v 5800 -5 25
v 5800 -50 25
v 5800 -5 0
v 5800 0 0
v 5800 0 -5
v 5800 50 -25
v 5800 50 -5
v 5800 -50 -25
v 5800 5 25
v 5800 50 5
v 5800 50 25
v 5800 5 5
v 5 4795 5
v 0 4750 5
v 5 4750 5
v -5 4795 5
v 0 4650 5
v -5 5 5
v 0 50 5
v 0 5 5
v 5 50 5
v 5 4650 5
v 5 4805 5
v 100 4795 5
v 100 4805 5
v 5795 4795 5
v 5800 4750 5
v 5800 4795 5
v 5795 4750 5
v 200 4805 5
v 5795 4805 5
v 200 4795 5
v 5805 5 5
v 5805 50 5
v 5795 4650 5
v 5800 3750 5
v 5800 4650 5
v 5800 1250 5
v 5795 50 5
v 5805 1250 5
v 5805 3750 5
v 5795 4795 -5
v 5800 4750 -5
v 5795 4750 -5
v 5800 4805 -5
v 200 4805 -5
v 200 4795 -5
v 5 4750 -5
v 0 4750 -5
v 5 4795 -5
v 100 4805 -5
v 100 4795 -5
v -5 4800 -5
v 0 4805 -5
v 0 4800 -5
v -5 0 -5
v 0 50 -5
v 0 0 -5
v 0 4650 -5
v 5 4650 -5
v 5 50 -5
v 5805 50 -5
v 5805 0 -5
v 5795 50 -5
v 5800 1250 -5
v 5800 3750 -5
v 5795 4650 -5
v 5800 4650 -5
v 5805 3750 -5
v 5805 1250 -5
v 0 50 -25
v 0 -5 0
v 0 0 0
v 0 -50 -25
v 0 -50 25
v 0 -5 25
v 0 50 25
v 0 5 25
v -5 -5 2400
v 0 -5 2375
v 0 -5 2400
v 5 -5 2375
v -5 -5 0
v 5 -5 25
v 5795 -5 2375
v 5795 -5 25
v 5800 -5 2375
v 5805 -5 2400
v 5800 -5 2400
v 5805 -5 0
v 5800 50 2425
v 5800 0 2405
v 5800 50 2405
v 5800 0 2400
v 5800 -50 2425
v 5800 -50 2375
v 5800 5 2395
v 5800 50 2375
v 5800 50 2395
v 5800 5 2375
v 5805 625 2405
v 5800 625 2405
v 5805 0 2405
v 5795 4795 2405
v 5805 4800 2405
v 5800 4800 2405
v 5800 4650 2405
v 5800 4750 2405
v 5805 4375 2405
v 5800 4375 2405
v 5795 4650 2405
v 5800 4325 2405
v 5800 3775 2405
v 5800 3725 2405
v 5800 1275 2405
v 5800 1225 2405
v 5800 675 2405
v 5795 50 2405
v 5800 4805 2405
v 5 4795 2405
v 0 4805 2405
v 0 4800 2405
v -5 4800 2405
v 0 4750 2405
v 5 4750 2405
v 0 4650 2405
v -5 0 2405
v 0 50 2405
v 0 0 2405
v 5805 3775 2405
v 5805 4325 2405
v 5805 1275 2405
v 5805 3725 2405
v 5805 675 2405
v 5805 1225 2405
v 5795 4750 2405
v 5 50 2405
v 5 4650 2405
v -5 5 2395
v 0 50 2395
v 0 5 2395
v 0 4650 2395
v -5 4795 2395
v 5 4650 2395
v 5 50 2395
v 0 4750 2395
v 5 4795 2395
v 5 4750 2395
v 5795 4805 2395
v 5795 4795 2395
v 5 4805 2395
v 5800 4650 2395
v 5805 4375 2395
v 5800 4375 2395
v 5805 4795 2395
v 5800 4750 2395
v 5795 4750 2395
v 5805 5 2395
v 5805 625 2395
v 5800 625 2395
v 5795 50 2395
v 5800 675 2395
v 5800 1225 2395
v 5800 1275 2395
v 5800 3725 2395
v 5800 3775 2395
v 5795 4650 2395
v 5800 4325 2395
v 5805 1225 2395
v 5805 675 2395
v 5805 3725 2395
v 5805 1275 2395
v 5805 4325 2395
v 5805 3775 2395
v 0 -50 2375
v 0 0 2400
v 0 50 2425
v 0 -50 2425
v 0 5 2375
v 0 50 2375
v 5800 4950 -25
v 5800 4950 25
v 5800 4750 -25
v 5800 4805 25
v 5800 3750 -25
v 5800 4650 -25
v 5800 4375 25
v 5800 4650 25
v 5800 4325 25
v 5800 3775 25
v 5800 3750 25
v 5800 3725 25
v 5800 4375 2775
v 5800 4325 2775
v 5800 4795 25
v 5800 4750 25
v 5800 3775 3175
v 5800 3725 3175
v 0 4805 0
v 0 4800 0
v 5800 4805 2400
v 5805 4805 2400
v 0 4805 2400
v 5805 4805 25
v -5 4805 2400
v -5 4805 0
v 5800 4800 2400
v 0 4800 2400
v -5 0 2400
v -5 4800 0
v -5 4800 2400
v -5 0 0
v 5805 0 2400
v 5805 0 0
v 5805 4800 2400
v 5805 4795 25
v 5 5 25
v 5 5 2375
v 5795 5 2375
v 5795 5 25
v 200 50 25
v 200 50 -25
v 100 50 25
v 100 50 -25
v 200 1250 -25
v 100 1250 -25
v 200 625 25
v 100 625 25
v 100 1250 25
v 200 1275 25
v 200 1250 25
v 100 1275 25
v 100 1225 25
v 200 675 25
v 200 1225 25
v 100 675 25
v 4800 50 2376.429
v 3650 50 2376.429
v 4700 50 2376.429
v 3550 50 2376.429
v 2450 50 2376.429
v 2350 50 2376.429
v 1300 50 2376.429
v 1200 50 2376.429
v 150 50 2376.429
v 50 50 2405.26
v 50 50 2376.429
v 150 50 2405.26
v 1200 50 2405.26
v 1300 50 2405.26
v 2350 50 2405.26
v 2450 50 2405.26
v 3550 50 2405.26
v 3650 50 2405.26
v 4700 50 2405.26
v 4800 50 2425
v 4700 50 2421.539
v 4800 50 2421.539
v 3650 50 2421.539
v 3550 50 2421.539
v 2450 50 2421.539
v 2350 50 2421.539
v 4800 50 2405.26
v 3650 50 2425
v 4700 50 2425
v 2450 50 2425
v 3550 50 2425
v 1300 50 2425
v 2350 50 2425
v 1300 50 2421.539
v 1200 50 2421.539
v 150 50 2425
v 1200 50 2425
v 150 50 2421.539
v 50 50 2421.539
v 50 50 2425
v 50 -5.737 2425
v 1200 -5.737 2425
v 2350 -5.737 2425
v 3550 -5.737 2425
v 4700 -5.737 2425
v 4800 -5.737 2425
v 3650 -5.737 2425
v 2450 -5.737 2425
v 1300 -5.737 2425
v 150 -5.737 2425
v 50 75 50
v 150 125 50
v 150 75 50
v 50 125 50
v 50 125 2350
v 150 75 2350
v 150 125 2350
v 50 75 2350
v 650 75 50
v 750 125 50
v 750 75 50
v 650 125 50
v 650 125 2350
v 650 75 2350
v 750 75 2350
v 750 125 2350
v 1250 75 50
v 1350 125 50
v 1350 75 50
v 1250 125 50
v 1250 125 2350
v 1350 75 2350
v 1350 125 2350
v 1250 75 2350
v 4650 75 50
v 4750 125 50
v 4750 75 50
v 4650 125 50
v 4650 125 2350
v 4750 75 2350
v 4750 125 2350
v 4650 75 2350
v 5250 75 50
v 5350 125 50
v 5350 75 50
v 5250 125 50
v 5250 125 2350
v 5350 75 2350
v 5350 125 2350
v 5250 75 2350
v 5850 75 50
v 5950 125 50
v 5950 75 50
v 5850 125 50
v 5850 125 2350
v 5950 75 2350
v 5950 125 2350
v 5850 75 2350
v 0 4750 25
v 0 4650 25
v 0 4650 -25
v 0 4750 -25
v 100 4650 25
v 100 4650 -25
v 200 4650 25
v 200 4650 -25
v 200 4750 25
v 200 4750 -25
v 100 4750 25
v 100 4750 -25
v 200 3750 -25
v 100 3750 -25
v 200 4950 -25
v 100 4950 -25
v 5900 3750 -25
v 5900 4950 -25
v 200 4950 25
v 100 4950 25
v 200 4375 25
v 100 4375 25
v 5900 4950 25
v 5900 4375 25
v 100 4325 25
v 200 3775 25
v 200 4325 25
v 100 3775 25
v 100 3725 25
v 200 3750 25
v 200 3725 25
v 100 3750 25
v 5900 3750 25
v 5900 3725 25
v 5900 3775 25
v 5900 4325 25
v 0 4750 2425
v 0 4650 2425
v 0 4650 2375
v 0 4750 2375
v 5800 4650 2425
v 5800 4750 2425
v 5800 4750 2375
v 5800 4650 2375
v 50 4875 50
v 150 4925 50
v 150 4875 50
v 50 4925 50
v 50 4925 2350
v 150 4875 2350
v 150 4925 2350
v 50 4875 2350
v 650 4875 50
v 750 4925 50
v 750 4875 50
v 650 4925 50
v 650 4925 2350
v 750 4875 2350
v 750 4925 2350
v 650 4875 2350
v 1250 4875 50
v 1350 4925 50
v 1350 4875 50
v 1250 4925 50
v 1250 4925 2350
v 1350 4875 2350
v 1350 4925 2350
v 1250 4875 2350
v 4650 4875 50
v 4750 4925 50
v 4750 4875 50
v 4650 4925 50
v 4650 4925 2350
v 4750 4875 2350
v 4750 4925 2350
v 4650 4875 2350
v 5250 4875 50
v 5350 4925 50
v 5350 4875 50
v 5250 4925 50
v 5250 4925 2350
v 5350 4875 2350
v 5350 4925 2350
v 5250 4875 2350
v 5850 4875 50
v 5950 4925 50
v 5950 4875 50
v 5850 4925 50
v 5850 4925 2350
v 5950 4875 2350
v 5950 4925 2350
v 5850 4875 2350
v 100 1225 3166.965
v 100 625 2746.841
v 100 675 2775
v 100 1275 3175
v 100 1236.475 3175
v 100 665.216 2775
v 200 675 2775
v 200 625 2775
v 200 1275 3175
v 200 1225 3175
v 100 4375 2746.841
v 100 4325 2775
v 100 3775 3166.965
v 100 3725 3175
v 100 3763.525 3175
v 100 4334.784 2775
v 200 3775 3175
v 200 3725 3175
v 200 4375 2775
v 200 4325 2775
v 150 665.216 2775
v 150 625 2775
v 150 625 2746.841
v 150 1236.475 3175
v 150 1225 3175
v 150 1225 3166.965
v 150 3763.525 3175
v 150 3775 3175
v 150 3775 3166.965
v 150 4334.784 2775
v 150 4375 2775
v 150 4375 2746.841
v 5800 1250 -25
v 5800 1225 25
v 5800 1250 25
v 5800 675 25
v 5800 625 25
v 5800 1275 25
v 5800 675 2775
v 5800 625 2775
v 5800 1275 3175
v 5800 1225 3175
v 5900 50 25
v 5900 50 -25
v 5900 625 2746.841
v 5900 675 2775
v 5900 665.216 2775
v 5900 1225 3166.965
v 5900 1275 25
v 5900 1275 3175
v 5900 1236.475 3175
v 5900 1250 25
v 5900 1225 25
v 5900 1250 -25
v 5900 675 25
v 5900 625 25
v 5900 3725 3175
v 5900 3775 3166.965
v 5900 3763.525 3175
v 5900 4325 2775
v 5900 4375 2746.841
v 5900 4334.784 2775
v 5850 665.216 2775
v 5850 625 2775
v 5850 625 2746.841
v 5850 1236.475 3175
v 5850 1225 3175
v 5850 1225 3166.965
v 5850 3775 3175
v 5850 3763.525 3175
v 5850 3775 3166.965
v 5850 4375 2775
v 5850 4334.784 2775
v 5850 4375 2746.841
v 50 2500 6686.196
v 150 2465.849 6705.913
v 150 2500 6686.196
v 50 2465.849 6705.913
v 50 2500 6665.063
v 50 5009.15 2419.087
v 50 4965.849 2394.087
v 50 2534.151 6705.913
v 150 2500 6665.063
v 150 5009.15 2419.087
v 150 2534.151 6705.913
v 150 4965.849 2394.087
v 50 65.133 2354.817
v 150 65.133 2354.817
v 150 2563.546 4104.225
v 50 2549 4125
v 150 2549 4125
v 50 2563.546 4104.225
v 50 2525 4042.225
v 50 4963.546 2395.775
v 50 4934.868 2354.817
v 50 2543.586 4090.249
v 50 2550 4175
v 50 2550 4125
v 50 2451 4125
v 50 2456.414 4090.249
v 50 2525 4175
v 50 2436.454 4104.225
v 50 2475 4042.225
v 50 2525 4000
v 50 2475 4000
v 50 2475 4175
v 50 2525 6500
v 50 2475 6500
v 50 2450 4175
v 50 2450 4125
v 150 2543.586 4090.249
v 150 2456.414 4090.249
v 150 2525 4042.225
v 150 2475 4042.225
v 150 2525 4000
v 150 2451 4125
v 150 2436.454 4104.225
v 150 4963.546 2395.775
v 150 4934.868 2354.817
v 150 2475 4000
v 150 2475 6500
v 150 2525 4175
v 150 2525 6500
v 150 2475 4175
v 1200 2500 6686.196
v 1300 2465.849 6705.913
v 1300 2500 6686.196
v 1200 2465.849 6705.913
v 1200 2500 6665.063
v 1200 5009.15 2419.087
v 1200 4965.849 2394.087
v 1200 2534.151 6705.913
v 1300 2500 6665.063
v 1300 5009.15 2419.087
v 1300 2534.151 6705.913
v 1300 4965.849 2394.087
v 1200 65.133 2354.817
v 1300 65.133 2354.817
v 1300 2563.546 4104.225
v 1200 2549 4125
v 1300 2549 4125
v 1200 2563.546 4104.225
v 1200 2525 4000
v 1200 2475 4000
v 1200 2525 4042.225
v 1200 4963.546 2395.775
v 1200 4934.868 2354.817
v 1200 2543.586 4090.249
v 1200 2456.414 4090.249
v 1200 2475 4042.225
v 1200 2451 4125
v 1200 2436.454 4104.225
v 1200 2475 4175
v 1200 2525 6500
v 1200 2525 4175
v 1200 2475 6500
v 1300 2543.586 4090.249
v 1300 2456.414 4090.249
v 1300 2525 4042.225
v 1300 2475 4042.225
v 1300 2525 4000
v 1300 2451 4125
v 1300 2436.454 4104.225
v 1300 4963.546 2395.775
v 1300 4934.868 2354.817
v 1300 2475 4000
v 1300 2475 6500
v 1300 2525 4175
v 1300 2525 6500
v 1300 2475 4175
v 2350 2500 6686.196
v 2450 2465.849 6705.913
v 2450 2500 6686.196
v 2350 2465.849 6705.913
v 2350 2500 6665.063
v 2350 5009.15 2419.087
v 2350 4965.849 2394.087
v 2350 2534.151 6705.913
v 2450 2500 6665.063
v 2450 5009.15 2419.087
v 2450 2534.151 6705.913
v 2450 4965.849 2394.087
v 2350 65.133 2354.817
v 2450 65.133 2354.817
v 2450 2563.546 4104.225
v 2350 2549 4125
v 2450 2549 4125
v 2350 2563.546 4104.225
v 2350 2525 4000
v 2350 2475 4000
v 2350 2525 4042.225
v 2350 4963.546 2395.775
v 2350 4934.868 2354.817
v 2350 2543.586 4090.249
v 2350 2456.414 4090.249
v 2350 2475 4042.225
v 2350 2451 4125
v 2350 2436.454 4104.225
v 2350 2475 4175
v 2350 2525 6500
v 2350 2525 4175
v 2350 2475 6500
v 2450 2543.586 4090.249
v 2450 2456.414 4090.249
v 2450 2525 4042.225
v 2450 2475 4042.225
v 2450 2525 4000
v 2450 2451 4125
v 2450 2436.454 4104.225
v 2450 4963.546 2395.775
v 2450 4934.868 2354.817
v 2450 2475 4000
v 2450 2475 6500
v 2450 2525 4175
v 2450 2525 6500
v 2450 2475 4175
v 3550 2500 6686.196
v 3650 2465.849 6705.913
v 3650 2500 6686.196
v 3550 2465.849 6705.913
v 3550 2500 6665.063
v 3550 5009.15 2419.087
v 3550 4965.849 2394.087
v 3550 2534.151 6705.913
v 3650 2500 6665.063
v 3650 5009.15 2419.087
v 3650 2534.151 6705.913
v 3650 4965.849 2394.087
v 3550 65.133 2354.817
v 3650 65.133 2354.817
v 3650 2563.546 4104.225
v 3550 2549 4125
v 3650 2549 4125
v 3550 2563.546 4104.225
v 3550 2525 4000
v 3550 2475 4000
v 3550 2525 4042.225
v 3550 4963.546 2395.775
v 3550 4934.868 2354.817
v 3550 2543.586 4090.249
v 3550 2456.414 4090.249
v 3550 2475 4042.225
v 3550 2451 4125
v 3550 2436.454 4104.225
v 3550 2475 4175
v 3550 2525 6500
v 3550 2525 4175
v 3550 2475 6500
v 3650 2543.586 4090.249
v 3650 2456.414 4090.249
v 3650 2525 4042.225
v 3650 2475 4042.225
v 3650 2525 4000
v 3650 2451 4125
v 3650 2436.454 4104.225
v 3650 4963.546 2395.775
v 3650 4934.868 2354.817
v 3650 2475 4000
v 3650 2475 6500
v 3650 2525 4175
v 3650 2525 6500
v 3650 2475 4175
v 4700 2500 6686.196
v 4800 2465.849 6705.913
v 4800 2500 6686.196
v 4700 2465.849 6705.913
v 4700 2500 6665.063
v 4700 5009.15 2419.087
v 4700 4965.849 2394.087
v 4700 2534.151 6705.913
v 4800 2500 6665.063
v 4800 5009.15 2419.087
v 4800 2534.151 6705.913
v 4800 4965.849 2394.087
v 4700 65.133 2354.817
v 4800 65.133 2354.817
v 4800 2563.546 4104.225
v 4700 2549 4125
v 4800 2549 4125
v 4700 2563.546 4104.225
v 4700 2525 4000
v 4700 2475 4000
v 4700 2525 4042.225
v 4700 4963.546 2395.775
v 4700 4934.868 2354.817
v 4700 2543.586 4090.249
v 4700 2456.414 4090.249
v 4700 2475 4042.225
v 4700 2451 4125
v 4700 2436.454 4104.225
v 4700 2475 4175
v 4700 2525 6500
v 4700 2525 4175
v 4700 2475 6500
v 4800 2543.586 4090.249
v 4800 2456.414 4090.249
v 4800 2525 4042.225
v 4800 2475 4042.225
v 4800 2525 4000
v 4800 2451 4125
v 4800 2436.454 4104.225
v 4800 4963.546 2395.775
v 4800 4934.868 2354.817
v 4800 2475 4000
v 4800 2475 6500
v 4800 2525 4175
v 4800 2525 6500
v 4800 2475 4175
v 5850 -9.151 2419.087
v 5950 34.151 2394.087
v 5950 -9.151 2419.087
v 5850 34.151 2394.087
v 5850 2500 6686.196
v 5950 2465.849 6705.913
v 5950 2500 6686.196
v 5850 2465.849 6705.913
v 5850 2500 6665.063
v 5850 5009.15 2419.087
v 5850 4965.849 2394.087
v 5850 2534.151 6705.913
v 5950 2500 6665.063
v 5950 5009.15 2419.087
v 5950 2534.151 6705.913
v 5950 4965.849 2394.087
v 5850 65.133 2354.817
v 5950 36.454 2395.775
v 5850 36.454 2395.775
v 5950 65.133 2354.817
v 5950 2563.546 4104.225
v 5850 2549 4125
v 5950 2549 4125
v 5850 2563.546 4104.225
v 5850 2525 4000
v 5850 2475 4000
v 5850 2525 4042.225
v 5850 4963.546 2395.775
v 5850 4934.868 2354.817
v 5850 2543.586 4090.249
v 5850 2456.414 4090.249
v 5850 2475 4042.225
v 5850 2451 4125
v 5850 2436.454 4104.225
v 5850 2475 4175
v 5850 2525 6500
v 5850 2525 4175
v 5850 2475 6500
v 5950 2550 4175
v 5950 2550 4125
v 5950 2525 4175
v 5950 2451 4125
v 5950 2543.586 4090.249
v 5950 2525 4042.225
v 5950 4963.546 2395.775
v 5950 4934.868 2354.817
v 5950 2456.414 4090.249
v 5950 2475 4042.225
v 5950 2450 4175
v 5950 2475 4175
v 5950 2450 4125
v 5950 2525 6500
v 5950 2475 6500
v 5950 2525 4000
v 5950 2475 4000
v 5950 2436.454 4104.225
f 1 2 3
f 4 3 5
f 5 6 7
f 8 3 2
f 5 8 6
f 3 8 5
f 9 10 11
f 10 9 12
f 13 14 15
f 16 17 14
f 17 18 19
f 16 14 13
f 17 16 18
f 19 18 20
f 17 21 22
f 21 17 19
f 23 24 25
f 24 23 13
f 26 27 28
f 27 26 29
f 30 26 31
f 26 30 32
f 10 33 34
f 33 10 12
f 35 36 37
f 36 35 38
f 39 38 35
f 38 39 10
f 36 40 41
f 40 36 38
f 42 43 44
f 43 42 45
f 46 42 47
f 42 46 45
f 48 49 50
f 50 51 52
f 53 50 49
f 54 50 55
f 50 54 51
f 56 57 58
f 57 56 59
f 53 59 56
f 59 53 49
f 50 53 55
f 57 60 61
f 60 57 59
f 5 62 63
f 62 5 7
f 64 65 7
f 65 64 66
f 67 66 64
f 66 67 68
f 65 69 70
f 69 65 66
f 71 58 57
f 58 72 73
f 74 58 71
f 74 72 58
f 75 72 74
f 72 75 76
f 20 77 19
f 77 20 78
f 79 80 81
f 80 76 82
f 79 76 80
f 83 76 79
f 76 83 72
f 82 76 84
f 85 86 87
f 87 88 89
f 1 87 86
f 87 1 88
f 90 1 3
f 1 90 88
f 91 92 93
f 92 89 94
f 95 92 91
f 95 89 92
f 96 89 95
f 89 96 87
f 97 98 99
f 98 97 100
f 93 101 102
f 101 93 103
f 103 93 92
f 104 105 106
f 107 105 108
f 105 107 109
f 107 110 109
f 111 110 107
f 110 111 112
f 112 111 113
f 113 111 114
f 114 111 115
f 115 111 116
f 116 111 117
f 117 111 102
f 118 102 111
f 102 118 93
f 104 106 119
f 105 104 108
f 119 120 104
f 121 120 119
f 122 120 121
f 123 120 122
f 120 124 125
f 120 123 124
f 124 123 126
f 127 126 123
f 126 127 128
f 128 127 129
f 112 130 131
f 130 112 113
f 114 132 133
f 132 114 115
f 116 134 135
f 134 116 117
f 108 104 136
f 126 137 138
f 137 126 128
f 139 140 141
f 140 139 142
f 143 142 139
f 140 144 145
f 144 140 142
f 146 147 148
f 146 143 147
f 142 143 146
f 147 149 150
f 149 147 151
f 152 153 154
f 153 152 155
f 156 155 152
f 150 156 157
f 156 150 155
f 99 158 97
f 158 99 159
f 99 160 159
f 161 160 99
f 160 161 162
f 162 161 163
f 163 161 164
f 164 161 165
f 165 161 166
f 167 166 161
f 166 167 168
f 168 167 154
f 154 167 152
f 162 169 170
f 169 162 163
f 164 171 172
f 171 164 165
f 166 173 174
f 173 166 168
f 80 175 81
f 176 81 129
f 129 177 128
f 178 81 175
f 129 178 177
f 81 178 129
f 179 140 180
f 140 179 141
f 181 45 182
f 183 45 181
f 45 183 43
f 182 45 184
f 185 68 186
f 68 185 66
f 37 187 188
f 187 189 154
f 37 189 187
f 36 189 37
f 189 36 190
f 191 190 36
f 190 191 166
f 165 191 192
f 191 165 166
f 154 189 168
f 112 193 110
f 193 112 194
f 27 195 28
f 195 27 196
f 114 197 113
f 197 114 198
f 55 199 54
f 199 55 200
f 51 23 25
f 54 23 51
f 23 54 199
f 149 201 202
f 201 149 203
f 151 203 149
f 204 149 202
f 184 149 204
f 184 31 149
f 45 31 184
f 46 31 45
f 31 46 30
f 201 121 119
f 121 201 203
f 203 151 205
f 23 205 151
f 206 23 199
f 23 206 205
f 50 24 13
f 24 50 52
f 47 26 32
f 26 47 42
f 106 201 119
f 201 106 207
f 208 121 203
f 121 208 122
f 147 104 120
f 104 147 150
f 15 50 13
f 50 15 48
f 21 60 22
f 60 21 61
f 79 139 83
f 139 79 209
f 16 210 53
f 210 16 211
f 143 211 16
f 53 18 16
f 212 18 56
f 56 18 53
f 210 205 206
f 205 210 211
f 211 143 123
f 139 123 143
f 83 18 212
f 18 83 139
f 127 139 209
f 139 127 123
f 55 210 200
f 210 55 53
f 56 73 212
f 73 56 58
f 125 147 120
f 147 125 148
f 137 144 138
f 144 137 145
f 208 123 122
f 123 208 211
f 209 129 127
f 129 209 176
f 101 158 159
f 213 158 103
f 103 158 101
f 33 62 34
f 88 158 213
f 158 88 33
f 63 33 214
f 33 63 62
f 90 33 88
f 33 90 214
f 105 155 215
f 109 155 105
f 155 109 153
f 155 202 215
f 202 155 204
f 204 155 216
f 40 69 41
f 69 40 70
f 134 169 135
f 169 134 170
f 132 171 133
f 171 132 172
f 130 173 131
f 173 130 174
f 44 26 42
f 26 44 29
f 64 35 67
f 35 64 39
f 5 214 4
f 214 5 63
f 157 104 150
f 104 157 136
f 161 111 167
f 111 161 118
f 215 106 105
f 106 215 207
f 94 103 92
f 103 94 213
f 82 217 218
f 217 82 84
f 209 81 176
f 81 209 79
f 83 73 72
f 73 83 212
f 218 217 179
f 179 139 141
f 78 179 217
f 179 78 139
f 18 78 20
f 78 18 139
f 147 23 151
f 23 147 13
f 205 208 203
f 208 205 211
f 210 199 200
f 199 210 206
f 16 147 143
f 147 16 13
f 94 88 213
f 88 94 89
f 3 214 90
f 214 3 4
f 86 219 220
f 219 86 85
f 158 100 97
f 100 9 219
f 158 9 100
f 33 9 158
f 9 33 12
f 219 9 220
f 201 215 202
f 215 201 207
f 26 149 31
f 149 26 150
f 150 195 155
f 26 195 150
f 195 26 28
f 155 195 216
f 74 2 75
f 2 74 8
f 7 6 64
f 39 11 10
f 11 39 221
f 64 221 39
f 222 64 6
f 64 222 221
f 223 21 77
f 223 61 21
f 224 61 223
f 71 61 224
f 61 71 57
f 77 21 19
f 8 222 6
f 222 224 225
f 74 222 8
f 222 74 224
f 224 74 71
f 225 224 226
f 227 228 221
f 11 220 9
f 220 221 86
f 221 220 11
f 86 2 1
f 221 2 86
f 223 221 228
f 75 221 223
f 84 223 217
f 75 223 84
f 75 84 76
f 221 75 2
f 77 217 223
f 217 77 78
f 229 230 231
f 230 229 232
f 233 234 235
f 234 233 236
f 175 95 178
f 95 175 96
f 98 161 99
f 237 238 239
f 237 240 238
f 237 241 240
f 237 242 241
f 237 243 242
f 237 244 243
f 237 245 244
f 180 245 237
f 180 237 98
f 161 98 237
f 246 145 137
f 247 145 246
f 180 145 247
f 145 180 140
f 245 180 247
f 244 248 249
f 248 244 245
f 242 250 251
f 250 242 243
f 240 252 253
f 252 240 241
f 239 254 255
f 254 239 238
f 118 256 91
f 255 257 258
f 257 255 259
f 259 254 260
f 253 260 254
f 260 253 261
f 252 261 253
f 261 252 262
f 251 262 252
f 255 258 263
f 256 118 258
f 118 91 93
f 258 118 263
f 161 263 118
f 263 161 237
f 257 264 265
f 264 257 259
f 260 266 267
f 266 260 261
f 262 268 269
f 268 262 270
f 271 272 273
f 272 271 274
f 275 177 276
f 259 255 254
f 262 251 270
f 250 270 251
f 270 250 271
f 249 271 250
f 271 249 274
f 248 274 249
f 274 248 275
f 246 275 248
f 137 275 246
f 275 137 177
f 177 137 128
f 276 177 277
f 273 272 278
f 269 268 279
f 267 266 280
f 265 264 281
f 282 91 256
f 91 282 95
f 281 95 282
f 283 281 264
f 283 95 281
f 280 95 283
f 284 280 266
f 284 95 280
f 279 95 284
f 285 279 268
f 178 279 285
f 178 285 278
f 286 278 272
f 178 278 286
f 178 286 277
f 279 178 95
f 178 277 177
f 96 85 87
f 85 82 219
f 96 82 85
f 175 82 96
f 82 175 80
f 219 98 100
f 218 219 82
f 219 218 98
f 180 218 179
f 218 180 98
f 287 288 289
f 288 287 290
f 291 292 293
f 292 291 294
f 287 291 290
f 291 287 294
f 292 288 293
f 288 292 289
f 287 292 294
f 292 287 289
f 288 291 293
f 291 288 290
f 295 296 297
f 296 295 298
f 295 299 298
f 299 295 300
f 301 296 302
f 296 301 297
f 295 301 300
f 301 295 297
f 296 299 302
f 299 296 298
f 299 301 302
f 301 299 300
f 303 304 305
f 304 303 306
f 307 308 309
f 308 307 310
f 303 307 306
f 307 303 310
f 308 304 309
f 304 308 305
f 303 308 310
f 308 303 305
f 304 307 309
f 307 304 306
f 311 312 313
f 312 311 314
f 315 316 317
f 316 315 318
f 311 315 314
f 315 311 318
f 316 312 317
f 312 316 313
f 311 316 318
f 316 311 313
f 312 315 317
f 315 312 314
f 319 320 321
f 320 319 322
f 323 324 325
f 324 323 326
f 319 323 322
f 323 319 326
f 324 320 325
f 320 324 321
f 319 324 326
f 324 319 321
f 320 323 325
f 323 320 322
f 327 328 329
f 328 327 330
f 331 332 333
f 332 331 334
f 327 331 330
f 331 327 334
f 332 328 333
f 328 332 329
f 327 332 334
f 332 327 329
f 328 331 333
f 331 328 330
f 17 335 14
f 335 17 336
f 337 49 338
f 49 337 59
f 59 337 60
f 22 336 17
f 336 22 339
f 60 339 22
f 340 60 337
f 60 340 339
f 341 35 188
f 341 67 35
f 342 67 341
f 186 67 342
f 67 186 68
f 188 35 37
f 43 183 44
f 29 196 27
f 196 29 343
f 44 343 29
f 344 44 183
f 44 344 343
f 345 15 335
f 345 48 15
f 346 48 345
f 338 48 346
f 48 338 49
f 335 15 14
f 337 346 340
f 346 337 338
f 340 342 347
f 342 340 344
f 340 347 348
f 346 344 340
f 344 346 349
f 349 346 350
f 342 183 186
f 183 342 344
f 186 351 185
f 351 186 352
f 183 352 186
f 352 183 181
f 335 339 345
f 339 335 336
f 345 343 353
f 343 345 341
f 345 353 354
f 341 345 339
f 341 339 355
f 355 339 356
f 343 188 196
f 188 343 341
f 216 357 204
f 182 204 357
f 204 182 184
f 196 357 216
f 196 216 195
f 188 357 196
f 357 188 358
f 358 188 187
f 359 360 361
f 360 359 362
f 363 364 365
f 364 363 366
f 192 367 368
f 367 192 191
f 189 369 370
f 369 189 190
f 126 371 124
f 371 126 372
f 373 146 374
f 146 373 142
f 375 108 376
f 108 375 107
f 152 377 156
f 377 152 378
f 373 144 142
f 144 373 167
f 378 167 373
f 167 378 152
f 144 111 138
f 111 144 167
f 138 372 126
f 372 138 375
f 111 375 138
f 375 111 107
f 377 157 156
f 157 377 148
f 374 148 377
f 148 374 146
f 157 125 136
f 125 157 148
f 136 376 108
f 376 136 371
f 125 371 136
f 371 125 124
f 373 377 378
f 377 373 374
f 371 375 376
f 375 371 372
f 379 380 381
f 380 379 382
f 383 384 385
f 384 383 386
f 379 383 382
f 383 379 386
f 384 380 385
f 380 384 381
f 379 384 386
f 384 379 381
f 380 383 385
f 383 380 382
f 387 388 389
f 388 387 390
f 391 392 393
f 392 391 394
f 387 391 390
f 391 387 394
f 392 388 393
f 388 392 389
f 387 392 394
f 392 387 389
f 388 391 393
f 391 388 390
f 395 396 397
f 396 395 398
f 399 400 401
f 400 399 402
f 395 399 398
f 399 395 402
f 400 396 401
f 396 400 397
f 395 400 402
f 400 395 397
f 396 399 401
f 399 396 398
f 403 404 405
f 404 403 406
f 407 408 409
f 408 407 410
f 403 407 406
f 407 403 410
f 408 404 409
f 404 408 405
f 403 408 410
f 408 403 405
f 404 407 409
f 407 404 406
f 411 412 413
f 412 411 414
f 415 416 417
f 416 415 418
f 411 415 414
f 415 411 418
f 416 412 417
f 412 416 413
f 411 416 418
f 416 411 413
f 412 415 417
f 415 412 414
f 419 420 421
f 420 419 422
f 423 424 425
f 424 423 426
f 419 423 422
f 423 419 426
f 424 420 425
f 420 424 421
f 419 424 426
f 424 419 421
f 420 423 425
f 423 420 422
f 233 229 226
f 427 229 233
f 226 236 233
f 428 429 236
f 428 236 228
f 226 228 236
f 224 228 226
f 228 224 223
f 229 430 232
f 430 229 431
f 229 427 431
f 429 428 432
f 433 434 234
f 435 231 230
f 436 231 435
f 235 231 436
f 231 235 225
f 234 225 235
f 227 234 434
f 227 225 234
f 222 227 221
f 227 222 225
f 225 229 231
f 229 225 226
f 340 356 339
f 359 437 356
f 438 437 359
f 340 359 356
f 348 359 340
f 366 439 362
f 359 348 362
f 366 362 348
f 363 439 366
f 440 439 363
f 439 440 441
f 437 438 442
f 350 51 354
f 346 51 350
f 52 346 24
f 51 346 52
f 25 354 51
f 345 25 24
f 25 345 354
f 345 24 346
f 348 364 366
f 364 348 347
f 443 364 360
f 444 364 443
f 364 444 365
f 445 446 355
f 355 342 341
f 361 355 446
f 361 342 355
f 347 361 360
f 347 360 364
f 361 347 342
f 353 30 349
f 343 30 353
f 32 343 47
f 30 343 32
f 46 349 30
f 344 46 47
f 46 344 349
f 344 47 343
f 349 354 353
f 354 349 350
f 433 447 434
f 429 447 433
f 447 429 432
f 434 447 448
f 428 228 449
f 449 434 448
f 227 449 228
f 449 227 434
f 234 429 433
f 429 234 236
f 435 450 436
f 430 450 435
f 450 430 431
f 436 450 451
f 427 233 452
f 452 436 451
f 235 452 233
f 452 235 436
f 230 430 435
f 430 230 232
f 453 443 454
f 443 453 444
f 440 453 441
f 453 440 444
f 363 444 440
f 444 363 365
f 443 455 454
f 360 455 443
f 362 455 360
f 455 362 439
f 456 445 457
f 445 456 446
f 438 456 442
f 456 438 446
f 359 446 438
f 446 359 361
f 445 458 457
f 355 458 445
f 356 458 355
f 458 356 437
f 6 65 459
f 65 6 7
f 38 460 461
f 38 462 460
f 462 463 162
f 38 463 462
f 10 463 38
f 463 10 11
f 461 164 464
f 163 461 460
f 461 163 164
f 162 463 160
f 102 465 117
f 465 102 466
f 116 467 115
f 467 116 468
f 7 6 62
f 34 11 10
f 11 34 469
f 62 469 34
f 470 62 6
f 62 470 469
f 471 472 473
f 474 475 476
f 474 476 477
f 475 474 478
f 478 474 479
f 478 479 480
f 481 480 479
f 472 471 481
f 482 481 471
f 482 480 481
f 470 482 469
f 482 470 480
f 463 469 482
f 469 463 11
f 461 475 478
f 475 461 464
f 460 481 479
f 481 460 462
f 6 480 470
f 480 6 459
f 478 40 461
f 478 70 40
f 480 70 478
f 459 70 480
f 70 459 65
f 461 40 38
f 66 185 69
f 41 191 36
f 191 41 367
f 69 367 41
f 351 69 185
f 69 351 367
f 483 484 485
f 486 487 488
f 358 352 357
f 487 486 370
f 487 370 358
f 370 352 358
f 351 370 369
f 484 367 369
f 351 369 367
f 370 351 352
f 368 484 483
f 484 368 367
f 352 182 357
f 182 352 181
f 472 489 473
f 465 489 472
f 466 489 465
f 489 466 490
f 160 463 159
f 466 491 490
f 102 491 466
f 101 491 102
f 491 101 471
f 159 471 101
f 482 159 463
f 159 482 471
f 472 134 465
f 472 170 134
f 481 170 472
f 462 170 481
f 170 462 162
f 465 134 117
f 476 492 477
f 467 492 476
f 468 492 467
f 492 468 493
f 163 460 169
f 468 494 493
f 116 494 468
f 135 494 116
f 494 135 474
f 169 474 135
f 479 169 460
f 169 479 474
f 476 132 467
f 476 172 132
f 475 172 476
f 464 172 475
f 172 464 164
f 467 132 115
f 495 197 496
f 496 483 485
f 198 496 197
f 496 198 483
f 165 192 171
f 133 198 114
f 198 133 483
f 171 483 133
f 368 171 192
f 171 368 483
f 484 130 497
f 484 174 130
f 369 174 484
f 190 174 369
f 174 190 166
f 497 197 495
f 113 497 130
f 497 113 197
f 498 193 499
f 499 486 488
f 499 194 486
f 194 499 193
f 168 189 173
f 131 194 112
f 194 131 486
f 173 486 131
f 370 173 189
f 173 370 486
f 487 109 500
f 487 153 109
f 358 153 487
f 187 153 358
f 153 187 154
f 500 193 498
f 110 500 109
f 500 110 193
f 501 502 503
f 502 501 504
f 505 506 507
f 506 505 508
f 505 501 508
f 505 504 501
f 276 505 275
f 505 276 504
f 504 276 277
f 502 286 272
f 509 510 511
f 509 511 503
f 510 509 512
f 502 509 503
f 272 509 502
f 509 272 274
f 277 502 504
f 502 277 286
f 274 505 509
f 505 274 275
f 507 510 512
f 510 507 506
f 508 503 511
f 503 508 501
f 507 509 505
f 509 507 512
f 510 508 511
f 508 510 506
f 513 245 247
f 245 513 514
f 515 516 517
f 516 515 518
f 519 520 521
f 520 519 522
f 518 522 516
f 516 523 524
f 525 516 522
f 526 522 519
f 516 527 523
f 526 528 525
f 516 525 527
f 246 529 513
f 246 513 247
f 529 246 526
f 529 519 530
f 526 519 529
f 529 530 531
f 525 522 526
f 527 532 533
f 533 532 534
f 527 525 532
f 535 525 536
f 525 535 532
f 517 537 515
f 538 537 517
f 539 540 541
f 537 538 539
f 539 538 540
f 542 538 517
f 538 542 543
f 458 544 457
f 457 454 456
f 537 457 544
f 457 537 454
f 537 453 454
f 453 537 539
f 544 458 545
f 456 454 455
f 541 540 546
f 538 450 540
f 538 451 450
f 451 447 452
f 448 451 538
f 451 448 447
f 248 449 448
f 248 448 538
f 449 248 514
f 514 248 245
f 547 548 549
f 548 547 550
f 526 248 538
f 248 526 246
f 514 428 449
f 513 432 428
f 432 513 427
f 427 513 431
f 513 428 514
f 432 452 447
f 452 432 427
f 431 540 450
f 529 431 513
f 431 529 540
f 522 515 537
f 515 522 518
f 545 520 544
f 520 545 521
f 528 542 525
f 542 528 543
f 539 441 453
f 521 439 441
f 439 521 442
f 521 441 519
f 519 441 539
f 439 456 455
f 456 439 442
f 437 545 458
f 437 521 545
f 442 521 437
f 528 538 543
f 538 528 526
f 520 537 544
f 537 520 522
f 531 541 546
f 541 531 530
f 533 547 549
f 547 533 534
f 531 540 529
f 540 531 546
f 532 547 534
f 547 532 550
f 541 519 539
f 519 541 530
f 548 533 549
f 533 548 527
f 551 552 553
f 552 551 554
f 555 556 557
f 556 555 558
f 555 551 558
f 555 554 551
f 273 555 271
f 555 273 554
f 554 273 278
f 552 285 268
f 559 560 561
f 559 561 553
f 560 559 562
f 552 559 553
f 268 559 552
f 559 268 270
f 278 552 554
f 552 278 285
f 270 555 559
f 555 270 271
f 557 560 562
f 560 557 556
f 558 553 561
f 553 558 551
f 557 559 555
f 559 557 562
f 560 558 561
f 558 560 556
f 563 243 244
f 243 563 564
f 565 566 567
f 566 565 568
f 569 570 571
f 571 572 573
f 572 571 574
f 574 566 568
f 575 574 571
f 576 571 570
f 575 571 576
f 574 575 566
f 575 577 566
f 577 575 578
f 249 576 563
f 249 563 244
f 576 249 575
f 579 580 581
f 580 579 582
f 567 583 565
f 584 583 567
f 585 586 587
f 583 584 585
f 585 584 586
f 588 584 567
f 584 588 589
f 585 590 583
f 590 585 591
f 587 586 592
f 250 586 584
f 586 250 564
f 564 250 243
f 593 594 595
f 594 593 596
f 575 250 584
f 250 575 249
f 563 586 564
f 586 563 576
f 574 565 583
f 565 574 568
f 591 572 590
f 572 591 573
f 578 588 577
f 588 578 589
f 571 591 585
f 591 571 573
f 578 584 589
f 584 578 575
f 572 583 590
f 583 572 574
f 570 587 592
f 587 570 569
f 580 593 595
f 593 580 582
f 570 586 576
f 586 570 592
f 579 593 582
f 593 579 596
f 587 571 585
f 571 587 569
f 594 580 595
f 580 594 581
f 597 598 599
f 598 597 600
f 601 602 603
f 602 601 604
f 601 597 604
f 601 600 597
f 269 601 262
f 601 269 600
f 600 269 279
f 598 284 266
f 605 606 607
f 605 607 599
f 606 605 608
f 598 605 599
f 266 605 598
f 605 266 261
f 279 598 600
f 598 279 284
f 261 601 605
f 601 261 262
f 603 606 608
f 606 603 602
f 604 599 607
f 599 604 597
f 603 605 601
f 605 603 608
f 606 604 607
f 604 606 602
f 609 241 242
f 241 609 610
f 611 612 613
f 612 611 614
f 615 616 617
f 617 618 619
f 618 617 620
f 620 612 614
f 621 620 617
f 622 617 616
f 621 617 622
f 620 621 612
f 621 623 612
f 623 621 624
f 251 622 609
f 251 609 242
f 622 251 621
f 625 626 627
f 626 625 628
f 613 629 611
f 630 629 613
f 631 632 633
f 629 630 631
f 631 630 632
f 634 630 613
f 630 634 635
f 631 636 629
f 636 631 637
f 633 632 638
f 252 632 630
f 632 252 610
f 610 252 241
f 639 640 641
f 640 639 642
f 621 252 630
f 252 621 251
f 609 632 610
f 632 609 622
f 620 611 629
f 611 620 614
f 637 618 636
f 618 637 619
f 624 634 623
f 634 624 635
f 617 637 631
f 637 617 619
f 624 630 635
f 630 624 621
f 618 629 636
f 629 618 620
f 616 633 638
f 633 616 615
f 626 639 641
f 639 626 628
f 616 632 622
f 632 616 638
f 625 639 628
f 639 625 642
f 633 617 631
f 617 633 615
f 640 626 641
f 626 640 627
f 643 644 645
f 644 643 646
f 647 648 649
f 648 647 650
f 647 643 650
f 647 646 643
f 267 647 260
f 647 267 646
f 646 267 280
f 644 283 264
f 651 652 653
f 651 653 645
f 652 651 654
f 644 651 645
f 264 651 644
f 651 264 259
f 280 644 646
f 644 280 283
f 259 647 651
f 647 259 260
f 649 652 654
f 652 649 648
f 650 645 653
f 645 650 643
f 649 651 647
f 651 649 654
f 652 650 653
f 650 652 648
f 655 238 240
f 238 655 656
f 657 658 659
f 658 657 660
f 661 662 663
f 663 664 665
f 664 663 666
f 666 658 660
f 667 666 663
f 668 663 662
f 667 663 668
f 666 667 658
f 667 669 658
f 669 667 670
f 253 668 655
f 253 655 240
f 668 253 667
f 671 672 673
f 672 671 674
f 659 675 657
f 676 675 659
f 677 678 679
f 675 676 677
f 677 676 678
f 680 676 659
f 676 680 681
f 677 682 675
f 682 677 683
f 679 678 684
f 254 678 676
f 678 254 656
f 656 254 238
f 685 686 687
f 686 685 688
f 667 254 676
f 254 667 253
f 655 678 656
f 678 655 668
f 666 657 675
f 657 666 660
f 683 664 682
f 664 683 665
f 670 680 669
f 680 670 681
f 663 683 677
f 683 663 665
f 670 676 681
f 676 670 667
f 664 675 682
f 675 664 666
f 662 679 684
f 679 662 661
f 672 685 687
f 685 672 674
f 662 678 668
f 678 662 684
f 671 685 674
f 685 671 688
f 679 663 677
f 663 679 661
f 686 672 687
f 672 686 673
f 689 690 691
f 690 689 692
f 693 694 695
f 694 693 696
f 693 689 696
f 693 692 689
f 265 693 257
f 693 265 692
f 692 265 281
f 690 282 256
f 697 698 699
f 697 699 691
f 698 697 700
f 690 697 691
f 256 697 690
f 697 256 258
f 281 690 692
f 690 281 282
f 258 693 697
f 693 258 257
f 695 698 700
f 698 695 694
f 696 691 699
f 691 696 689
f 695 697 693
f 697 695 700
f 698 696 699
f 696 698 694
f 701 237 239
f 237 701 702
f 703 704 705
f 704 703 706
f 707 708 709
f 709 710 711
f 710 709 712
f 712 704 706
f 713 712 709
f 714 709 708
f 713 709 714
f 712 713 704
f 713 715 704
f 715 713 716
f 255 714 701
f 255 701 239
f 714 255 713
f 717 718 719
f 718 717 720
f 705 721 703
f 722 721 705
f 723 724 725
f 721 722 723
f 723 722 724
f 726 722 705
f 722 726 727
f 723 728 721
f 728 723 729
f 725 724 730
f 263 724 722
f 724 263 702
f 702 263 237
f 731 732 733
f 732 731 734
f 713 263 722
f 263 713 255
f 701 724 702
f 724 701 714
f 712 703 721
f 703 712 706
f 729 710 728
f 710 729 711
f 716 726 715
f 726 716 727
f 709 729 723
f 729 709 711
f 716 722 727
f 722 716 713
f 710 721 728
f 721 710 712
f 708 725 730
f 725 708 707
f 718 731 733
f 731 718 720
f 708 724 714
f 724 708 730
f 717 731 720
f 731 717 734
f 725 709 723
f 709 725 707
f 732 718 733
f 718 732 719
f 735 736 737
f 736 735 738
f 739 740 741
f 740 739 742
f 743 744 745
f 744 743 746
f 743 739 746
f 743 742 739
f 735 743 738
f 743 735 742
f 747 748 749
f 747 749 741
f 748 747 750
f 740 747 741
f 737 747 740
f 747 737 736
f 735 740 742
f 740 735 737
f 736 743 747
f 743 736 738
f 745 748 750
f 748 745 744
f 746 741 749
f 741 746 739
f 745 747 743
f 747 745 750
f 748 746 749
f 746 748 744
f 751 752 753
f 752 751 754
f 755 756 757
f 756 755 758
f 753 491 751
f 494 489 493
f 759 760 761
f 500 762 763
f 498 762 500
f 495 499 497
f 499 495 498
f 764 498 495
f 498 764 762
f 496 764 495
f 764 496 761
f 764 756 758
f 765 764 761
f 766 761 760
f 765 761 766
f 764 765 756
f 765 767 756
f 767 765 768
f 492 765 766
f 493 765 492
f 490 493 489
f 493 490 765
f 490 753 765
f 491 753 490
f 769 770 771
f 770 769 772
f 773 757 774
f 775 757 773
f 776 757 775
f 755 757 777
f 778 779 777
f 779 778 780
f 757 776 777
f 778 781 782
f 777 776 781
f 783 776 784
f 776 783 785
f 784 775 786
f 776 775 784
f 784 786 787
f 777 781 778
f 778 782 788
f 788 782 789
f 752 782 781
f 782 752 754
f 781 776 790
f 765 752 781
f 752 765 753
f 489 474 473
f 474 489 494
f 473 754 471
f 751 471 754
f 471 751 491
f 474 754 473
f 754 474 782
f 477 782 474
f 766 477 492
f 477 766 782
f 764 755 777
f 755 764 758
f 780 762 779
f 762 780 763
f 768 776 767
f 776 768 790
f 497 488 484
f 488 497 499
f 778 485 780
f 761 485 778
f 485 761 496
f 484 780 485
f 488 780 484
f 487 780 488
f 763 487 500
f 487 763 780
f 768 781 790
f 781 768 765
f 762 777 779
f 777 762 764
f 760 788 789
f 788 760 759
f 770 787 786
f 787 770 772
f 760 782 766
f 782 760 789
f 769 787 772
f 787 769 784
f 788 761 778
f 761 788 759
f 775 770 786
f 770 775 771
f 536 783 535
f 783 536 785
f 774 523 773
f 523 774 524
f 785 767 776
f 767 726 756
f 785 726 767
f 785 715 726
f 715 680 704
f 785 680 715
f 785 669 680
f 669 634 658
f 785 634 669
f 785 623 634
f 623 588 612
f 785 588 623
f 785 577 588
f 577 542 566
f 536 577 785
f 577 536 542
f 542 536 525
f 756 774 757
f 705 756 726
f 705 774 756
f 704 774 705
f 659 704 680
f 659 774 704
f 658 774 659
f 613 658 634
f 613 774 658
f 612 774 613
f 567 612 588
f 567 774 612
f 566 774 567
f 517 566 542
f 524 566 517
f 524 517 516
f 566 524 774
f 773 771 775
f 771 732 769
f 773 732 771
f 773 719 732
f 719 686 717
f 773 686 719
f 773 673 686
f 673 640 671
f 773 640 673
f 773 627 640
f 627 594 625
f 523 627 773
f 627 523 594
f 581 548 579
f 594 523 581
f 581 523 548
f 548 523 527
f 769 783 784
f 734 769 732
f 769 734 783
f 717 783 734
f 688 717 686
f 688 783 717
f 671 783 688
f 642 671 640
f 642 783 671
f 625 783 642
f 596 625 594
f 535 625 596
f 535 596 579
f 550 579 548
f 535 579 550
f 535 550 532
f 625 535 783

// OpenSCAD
// Generated from garage_viewer_grid50_colored.ipynb
// 2x4 approximated as 50x100 mm. Colors by equal length.
thickness = 50;
width = 100;

poses = [
  [1, 5800, [2900, 0, 0], [90, 0, 0], [1.000000, 0.596078, 0.588235]],
  [2, 5800, [2900, 0, 2400], [90, 0, 0], [1.000000, 0.596078, 0.588235]],
  [3, 2300, [100, 100, 1200], [0, -90, 0], [0.682353, 0.780392, 0.909804]],
  [4, 2300, [700, 100, 1200], [0, -90, 0], [0.682353, 0.780392, 0.909804]],
  [5, 2300, [1300, 100, 1200], [0, -90, 0], [0.682353, 0.780392, 0.909804]],
  [6, 2300, [4700, 100, 1200], [0, -90, 0], [0.682353, 0.780392, 0.909804]],
  [7, 2300, [5300, 100, 1200], [0, -90, 0], [0.682353, 0.780392, 0.909804]],
  [8, 2300, [5900, 100, 1200], [0, -90, 0], [0.682353, 0.780392, 0.909804]],
  [9, 5800, [2900, 4700, 0], [90, 0, 0], [1.000000, 0.596078, 0.588235]],
  [10, 5800, [2900, 4700, 2400], [90, 0, 0], [1.000000, 0.596078, 0.588235]],
  [11, 2300, [100, 4900, 1200], [0, -90, 0], [0.682353, 0.780392, 0.909804]],
  [12, 2300, [700, 4900, 1200], [0, -90, 0], [0.682353, 0.780392, 0.909804]],
  [13, 2300, [1300, 4900, 1200], [0, -90, 0], [0.682353, 0.780392, 0.909804]],
  [14, 2300, [4700, 4900, 1200], [0, -90, 0], [0.682353, 0.780392, 0.909804]],
  [15, 2300, [5300, 4900, 1200], [0, -90, 0], [0.682353, 0.780392, 0.909804]],
  [16, 2300, [5900, 4900, 1200], [0, -90, 0], [0.682353, 0.780392, 0.909804]],
  [17, 1200, [150, 650, 0], [-90, 0, 90], [0.121569, 0.466667, 0.705882]],
  [18, 1200, [150, 4350, 0], [-90, 0, 90], [0.121569, 0.466667, 0.705882]],
  [20, 2750, [150, 650, 1400], [0, -90, 0], [1.000000, 0.733333, 0.470588]],
  [21, 3150, [150, 1250, 1600], [0, -90, 0], [0.596078, 0.874510, 0.541176]],
  [22, 3150, [150, 3750, 1600], [0, -90, 0], [0.596078, 0.874510, 0.541176]],
  [23, 2750, [150, 4350, 1400], [0, -90, 0], [1.000000, 0.733333, 0.470588]],
  [25, 1200, [5850, 650, 0], [-90, 0, 90], [0.121569, 0.466667, 0.705882]],
  [26, 1200, [5850, 4350, 0], [-90, 0, 90], [0.121569, 0.466667, 0.705882]],
  [28, 2750, [5850, 650, 1400], [0, -90, 0], [1.000000, 0.733333, 0.470588]],
  [29, 3150, [5850, 1250, 1600], [0, -90, 0], [0.596078, 0.874510, 0.541176]],
  [30, 3150, [5850, 3750, 1600], [0, -90, 0], [0.596078, 0.874510, 0.541176]],
  [31, 2750, [5850, 4350, 1400], [0, -90, 0], [1.000000, 0.733333, 0.470588]],
  [33, 4950, [100, 1250, 4550], [-90, -60, 90], [0.839216, 0.152941, 0.156863]],
  [34, 4950, [100, 3750, 4550], [90, -60, -90], [0.839216, 0.152941, 0.156863]],
  [35, 3050, [100, 1300, 3250], [-90, -35, 90], [0.172549, 0.627451, 0.172549]],
  [36, 3050, [100, 3700, 3250], [90, -35, -90], [0.172549, 0.627451, 0.172549]],
  [37, 2500, [100, 2500, 5250], [0, -90, 0], [1.000000, 0.498039, 0.054902]],
  [38, 4950, [1250, 1250, 4550], [-90, -60, 90], [0.839216, 0.152941, 0.156863]],
  [39, 4950, [1250, 3750, 4550], [90, -60, -90], [0.839216, 0.152941, 0.156863]],
  [40, 3050, [1250, 1300, 3250], [-90, -35, 90], [0.172549, 0.627451, 0.172549]],
  [41, 3050, [1250, 3700, 3250], [90, -35, -90], [0.172549, 0.627451, 0.172549]],
  [42, 2500, [1250, 2500, 5250], [0, -90, 0], [1.000000, 0.498039, 0.054902]],
  [43, 4950, [2400, 1250, 4550], [-90, -60, 90], [0.839216, 0.152941, 0.156863]],
  [44, 4950, [2400, 3750, 4550], [90, -60, -90], [0.839216, 0.152941, 0.156863]],
  [45, 3050, [2400, 1300, 3250], [-90, -35, 90], [0.172549, 0.627451, 0.172549]],
  [46, 3050, [2400, 3700, 3250], [90, -35, -90], [0.172549, 0.627451, 0.172549]],
  [47, 2500, [2400, 2500, 5250], [0, -90, 0], [1.000000, 0.498039, 0.054902]],
  [48, 4950, [3600, 1250, 4550], [-90, -60, 90], [0.839216, 0.152941, 0.156863]],
  [49, 4950, [3600, 3750, 4550], [90, -60, -90], [0.839216, 0.152941, 0.156863]],
  [50, 3050, [3600, 1300, 3250], [-90, -35, 90], [0.172549, 0.627451, 0.172549]],
  [51, 3050, [3600, 3700, 3250], [90, -35, -90], [0.172549, 0.627451, 0.172549]],
  [52, 2500, [3600, 2500, 5250], [0, -90, 0], [1.000000, 0.498039, 0.054902]],
  [53, 4950, [4750, 1250, 4550], [-90, -60, 90], [0.839216, 0.152941, 0.156863]],
  [54, 4950, [4750, 3750, 4550], [90, -60, -90], [0.839216, 0.152941, 0.156863]],
  [55, 3050, [4750, 1300, 3250], [-90, -35, 90], [0.172549, 0.627451, 0.172549]],
  [56, 3050, [4750, 3700, 3250], [90, -35, -90], [0.172549, 0.627451, 0.172549]],
  [57, 2500, [4750, 2500, 5250], [0, -90, 0], [1.000000, 0.498039, 0.054902]],
  [58, 4950, [5900, 1250, 4550], [-90, -60, 90], [0.839216, 0.152941, 0.156863]],
  [59, 4950, [5900, 3750, 4550], [90, -60, -90], [0.839216, 0.152941, 0.156863]],
  [60, 3050, [5900, 1300, 3250], [-90, -35, 90], [0.172549, 0.627451, 0.172549]],
  [61, 3050, [5900, 3700, 3250], [90, -35, -90], [0.172549, 0.627451, 0.172549]],
  [62, 2500, [5900, 2500, 5250], [0, -90, 0], [1.000000, 0.498039, 0.054902]],
  [63, 5900, [3000, 2500, 4150], [90, 0, 0], [1.000000, 0.596078, 0.588235]],
];

module beam(len, pos, rot, rgb){
  color(rgb)
    translate(pos)
      rotate(rot)
        cube([len, thickness, width], center=true);
}

// Red bounding box from (0,0,0) to (5800,4800,2400)
bbox = [5800, 4800, 2400];
edge = 10;
module bbox_wire(b){
  x=b[0]; y=b[1]; z=b[2];
  color([1,0,0]) {
    for (yy=[0,y], zz=[0,z]) translate([x/2, yy, zz]) cube([x, edge, edge], center=true);
    for (xx=[0,x], zz=[0,z]) translate([xx, y/2, zz]) cube([edge, y, edge], center=true);
    for (xx=[0,x], yy=[0,y]) translate([xx, yy, z/2]) cube([edge, edge, z], center=true);
  }
}

bbox_wire(bbox);

for (p = poses) {
  beam(p[1], p[2], p[3], p[4]);
}
